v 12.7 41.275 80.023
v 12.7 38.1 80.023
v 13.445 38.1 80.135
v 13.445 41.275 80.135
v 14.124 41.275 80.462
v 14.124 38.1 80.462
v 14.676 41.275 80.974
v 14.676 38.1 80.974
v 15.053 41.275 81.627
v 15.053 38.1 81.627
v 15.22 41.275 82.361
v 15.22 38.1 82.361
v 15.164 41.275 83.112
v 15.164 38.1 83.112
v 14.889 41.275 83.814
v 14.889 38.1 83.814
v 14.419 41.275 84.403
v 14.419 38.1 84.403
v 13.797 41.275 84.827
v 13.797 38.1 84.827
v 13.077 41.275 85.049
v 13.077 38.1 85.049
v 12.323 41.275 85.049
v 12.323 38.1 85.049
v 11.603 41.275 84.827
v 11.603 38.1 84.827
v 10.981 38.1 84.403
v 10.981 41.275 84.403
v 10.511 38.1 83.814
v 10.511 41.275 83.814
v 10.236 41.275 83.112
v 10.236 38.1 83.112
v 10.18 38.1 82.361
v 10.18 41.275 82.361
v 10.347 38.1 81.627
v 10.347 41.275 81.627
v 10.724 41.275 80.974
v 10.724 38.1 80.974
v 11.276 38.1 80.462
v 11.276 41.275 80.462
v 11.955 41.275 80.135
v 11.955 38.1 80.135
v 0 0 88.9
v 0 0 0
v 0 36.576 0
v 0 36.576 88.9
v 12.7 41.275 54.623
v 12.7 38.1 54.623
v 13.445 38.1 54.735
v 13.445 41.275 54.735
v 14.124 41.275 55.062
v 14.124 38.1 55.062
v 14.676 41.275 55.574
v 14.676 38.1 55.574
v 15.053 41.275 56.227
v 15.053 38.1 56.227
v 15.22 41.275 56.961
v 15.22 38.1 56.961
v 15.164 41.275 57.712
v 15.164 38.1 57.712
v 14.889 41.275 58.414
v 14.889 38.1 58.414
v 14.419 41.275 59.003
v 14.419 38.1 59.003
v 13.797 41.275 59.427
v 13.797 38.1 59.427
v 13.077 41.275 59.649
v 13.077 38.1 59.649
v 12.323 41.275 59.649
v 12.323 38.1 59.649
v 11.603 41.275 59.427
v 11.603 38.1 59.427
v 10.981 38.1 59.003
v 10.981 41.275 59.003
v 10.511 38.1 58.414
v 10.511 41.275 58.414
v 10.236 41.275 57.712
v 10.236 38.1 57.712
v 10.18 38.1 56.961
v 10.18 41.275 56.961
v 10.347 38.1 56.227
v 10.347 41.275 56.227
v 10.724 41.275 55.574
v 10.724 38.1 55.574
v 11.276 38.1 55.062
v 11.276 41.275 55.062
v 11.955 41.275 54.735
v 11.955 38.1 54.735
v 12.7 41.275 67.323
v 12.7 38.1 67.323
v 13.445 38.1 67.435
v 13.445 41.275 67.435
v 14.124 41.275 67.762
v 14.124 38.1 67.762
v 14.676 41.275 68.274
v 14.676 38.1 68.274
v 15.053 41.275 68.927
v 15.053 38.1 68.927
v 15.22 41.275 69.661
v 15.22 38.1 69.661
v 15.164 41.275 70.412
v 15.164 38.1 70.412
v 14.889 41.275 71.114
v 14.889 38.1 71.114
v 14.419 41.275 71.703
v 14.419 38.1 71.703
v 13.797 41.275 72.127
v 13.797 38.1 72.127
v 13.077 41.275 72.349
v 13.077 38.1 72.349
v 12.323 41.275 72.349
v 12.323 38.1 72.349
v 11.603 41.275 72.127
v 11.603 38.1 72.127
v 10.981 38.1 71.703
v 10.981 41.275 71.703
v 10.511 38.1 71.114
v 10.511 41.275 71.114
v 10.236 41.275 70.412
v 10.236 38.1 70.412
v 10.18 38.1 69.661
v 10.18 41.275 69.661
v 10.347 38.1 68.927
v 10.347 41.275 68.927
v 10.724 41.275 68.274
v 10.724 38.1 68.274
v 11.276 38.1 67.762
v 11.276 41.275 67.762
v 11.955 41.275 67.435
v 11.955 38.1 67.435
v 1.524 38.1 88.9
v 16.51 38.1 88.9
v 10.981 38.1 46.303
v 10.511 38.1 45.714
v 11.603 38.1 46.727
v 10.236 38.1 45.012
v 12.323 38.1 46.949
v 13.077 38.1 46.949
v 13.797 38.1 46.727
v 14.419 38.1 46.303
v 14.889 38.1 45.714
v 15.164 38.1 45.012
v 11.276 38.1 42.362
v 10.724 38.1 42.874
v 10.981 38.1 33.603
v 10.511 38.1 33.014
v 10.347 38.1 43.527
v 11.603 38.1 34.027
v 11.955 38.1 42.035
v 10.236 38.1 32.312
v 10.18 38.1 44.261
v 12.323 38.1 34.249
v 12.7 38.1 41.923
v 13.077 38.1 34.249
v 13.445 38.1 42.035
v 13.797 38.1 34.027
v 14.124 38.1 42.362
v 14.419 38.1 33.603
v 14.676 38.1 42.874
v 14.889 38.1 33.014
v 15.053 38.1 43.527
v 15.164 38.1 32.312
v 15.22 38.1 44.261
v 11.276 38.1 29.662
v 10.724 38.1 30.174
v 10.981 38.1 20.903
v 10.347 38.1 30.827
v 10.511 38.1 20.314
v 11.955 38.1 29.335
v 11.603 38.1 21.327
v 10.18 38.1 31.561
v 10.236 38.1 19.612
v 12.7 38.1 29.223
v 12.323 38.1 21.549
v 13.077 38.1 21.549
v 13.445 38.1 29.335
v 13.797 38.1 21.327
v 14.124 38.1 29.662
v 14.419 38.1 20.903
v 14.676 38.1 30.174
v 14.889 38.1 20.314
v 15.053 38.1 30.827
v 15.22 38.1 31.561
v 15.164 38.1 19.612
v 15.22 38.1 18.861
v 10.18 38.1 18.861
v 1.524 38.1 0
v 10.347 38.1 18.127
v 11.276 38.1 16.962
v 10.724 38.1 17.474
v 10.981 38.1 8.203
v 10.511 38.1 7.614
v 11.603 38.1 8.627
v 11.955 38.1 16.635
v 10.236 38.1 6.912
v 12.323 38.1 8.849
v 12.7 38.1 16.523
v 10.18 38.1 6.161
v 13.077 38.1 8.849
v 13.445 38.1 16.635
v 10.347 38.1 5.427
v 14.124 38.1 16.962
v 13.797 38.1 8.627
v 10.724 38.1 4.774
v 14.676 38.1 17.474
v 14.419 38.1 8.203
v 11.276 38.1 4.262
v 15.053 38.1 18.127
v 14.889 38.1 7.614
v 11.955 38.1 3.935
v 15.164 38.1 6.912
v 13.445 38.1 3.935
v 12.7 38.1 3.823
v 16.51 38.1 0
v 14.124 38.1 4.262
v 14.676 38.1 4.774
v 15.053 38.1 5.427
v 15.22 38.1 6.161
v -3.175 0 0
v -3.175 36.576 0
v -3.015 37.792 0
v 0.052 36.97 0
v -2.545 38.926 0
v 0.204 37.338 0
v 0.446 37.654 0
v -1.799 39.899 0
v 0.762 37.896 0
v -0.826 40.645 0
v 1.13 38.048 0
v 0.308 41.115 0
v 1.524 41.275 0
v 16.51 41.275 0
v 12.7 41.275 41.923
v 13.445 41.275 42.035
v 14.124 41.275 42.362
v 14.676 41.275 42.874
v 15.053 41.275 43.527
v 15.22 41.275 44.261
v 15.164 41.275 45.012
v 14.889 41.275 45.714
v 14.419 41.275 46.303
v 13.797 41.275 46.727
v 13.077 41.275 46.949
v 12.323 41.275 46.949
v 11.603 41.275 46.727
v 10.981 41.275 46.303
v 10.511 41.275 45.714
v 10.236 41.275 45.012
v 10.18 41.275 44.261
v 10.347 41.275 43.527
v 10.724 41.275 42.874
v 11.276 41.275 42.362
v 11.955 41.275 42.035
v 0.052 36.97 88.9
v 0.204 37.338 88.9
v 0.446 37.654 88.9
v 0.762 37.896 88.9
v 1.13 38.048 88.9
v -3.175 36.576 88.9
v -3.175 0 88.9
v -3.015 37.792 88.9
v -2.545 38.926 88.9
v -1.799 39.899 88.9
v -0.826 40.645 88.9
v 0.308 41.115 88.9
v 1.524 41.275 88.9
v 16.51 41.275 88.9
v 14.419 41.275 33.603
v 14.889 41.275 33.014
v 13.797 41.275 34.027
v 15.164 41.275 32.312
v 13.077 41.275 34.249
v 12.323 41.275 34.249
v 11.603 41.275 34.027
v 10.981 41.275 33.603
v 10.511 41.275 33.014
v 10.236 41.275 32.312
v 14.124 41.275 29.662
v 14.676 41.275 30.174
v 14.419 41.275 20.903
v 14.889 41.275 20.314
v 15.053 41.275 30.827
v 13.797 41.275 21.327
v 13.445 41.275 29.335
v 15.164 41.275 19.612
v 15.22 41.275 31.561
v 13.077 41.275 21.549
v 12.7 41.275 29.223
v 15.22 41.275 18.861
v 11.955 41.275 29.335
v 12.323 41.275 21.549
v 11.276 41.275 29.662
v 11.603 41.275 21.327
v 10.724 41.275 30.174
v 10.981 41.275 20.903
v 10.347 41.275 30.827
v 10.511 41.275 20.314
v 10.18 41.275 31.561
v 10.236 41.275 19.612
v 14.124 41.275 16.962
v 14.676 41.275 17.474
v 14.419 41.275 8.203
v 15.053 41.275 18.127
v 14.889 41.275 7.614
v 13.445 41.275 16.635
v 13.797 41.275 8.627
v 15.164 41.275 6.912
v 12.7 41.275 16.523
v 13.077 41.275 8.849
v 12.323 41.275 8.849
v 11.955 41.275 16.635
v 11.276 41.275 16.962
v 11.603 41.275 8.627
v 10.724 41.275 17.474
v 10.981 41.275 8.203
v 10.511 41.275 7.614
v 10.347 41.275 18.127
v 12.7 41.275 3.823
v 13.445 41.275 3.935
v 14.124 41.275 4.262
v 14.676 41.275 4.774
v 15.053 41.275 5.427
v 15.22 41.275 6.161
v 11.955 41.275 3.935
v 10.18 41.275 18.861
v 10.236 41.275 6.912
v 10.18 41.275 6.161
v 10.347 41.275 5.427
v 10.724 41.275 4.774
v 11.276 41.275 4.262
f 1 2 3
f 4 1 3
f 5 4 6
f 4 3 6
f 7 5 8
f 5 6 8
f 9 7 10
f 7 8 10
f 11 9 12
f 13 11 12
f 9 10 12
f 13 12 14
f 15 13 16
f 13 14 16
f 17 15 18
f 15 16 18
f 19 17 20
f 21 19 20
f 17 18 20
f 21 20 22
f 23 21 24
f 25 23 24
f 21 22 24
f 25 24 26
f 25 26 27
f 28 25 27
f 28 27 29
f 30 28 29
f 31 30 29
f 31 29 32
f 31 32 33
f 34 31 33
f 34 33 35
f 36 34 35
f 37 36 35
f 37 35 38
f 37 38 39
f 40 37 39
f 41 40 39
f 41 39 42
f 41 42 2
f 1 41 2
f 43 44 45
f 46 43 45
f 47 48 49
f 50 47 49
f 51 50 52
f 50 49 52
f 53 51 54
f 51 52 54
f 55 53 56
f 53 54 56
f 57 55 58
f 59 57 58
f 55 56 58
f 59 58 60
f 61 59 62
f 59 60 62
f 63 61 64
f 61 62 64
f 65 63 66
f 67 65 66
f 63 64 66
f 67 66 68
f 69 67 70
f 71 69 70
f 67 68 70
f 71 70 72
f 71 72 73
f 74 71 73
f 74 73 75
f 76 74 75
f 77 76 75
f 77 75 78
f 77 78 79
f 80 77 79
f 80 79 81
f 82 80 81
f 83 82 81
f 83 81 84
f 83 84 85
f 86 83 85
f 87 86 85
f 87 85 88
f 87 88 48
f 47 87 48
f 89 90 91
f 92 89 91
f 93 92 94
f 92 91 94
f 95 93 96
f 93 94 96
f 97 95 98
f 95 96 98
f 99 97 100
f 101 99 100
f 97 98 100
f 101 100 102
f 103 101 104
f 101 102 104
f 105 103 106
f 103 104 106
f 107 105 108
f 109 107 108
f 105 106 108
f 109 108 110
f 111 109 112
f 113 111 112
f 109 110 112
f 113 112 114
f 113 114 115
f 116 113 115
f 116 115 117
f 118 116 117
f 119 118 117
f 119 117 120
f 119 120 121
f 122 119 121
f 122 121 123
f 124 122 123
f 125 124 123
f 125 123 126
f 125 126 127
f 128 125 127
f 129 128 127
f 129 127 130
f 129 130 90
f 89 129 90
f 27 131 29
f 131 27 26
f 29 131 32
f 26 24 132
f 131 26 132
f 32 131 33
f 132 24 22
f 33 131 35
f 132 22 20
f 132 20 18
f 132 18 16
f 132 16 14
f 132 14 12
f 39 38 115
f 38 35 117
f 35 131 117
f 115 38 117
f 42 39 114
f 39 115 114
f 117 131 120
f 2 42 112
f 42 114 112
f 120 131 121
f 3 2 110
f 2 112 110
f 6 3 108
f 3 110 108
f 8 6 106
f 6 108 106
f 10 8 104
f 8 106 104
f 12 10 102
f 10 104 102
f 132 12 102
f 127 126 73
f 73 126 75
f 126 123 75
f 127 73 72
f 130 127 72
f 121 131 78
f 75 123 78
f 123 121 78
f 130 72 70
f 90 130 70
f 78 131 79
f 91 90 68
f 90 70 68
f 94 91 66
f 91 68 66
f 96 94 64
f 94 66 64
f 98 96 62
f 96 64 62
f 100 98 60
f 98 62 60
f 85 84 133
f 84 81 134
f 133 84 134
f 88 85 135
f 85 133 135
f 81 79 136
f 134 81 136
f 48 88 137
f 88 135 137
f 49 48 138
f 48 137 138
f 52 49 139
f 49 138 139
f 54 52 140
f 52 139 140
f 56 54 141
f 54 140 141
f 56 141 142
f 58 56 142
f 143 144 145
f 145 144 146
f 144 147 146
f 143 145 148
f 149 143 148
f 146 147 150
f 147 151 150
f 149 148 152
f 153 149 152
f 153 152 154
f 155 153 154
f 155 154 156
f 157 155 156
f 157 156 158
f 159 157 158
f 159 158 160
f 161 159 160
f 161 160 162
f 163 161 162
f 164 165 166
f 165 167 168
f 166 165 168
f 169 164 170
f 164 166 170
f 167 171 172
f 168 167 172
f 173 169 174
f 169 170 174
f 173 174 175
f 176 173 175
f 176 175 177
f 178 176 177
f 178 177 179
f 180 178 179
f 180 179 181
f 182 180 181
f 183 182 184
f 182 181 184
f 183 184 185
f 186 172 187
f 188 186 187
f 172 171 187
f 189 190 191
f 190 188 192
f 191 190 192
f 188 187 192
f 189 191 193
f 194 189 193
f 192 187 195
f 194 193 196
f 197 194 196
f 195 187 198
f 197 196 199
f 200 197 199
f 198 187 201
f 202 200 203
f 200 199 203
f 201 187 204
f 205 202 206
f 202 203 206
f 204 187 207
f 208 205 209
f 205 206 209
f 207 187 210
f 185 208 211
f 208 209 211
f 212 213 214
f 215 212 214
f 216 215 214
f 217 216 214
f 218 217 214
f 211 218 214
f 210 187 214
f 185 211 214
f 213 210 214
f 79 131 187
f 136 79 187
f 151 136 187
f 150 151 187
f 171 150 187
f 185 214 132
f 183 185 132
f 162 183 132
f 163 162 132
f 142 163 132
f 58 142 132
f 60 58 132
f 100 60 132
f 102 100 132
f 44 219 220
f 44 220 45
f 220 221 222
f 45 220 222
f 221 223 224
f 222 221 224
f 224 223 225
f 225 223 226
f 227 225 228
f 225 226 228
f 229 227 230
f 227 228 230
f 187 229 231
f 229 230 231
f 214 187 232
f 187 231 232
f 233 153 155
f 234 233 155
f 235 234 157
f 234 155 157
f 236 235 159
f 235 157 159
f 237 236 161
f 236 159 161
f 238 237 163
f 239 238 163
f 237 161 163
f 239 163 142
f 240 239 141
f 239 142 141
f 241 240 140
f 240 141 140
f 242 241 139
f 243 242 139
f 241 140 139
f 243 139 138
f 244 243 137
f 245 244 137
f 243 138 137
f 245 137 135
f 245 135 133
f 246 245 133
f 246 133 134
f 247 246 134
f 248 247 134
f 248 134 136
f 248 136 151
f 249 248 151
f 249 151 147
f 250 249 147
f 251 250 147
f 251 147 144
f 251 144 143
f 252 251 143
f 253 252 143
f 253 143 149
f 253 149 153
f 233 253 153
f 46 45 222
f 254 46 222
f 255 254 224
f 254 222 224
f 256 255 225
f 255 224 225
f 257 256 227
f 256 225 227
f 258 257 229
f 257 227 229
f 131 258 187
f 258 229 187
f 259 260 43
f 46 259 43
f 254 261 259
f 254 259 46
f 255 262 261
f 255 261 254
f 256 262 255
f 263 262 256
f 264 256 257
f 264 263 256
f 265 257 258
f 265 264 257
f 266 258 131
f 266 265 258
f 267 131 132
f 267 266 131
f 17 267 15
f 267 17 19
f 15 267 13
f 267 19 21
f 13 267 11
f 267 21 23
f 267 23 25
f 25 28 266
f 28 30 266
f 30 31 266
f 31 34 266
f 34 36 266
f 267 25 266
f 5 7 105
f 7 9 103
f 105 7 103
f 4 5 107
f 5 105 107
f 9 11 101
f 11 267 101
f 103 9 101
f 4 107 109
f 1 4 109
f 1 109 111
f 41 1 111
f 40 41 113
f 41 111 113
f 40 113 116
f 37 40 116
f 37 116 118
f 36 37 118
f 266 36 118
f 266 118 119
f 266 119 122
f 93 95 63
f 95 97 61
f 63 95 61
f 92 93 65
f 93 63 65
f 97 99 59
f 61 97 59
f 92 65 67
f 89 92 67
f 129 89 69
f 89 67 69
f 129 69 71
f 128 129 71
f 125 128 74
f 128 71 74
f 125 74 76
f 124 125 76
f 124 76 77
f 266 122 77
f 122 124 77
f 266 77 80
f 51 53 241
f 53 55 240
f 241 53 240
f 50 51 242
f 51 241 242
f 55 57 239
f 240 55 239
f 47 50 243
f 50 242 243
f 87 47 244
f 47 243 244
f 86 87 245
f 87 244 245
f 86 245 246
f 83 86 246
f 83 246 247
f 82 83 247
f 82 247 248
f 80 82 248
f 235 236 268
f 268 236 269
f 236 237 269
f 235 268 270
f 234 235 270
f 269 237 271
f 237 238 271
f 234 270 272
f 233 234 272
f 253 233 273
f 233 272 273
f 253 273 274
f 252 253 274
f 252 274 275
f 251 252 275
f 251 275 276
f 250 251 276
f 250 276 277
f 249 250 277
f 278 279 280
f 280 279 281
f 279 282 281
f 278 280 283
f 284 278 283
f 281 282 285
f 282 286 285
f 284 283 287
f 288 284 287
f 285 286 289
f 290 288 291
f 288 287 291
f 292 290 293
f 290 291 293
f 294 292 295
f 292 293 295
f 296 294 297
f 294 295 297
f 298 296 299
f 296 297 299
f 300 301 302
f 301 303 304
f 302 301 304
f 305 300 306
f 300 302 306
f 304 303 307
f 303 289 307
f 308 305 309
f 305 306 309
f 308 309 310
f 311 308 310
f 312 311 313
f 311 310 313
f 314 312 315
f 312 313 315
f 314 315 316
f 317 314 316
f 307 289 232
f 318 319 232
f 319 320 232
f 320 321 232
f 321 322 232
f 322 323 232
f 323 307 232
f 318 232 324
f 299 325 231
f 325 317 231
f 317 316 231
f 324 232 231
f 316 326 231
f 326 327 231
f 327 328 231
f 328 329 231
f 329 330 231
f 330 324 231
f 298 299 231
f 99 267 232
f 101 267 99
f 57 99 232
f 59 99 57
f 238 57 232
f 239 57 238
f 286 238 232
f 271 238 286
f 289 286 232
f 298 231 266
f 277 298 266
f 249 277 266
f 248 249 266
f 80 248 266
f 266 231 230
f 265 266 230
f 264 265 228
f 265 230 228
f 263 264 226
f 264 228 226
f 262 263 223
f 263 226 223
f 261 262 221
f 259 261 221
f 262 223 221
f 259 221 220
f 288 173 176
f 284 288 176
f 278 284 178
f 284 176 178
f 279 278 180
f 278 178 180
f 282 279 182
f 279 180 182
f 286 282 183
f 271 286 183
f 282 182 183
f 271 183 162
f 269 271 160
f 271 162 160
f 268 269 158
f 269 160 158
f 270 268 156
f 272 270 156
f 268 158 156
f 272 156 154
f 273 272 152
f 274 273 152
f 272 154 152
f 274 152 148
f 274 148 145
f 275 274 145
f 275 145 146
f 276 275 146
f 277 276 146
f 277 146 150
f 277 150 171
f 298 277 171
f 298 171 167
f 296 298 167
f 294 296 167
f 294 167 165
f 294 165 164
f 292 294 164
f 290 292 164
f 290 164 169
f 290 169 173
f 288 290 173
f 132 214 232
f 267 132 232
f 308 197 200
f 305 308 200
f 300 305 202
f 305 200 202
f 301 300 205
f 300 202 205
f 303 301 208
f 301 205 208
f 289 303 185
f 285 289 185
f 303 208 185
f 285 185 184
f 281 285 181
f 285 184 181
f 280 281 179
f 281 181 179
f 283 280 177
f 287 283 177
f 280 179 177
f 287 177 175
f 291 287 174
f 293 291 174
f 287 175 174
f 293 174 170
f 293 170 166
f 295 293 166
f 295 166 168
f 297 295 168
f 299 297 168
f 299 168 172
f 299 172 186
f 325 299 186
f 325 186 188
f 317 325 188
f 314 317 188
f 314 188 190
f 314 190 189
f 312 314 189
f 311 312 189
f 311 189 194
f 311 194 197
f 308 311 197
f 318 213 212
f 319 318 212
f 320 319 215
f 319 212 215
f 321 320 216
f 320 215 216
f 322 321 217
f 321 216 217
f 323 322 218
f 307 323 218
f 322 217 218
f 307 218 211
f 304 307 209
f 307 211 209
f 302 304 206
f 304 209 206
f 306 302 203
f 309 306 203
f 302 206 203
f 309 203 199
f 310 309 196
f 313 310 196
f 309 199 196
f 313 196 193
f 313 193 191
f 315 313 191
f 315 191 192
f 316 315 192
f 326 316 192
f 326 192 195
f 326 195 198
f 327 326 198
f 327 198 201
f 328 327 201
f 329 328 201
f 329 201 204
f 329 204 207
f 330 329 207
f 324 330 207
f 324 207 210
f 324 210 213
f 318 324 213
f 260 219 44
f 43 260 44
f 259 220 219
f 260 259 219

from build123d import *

# Parameters (mm, degrees)
BASE_FLANGE1_DEPTH         = 88.9
F_8_0_199_DIAMETER_HOLE1_D = 5.0546


# Sheet-metal steps are written as plain solids
with BuildPart() as part:
    # Sketch1 → Base-Flange1 (new body)
    with BuildSketch(Plane.XY):
        with BuildLine():
            Line((0, 0), (0, 36.576))
            ThreePointArc((0, 36.576), (0.446369265, 37.653630735), (1.524, 38.1))
            Line((1.524, 38.1), (16.51, 38.1))
            Line((16.51, 38.1), (16.51, 41.275))
            Line((16.51, 41.275), (1.524, 41.275))
            ThreePointArc((1.524, 41.275), (-1.798694765, 39.898694765), (-3.175, 36.576))
            Line((-3.175, 36.576), (-3.175, 0))
            Line((-3.175, 0), (0, 0))
        make_face()
    extrude(amount=BASE_FLANGE1_DEPTH)

    # #8 (0.199) Diameter Hole1 (through all)
    with Locations(Plane(origin=(12.7, 41.275, 6.35), x_dir=(0, 0, 1), z_dir=(0, 1, 0))):
        with Locations((0, 0), (12.7, 0), (25.4, 0), (38.1, 0), (50.8, 0), (63.5, 0), (76.2, 0)):
            Hole(F_8_0_199_DIAMETER_HOLE1_D / 2)


solid = part.part
